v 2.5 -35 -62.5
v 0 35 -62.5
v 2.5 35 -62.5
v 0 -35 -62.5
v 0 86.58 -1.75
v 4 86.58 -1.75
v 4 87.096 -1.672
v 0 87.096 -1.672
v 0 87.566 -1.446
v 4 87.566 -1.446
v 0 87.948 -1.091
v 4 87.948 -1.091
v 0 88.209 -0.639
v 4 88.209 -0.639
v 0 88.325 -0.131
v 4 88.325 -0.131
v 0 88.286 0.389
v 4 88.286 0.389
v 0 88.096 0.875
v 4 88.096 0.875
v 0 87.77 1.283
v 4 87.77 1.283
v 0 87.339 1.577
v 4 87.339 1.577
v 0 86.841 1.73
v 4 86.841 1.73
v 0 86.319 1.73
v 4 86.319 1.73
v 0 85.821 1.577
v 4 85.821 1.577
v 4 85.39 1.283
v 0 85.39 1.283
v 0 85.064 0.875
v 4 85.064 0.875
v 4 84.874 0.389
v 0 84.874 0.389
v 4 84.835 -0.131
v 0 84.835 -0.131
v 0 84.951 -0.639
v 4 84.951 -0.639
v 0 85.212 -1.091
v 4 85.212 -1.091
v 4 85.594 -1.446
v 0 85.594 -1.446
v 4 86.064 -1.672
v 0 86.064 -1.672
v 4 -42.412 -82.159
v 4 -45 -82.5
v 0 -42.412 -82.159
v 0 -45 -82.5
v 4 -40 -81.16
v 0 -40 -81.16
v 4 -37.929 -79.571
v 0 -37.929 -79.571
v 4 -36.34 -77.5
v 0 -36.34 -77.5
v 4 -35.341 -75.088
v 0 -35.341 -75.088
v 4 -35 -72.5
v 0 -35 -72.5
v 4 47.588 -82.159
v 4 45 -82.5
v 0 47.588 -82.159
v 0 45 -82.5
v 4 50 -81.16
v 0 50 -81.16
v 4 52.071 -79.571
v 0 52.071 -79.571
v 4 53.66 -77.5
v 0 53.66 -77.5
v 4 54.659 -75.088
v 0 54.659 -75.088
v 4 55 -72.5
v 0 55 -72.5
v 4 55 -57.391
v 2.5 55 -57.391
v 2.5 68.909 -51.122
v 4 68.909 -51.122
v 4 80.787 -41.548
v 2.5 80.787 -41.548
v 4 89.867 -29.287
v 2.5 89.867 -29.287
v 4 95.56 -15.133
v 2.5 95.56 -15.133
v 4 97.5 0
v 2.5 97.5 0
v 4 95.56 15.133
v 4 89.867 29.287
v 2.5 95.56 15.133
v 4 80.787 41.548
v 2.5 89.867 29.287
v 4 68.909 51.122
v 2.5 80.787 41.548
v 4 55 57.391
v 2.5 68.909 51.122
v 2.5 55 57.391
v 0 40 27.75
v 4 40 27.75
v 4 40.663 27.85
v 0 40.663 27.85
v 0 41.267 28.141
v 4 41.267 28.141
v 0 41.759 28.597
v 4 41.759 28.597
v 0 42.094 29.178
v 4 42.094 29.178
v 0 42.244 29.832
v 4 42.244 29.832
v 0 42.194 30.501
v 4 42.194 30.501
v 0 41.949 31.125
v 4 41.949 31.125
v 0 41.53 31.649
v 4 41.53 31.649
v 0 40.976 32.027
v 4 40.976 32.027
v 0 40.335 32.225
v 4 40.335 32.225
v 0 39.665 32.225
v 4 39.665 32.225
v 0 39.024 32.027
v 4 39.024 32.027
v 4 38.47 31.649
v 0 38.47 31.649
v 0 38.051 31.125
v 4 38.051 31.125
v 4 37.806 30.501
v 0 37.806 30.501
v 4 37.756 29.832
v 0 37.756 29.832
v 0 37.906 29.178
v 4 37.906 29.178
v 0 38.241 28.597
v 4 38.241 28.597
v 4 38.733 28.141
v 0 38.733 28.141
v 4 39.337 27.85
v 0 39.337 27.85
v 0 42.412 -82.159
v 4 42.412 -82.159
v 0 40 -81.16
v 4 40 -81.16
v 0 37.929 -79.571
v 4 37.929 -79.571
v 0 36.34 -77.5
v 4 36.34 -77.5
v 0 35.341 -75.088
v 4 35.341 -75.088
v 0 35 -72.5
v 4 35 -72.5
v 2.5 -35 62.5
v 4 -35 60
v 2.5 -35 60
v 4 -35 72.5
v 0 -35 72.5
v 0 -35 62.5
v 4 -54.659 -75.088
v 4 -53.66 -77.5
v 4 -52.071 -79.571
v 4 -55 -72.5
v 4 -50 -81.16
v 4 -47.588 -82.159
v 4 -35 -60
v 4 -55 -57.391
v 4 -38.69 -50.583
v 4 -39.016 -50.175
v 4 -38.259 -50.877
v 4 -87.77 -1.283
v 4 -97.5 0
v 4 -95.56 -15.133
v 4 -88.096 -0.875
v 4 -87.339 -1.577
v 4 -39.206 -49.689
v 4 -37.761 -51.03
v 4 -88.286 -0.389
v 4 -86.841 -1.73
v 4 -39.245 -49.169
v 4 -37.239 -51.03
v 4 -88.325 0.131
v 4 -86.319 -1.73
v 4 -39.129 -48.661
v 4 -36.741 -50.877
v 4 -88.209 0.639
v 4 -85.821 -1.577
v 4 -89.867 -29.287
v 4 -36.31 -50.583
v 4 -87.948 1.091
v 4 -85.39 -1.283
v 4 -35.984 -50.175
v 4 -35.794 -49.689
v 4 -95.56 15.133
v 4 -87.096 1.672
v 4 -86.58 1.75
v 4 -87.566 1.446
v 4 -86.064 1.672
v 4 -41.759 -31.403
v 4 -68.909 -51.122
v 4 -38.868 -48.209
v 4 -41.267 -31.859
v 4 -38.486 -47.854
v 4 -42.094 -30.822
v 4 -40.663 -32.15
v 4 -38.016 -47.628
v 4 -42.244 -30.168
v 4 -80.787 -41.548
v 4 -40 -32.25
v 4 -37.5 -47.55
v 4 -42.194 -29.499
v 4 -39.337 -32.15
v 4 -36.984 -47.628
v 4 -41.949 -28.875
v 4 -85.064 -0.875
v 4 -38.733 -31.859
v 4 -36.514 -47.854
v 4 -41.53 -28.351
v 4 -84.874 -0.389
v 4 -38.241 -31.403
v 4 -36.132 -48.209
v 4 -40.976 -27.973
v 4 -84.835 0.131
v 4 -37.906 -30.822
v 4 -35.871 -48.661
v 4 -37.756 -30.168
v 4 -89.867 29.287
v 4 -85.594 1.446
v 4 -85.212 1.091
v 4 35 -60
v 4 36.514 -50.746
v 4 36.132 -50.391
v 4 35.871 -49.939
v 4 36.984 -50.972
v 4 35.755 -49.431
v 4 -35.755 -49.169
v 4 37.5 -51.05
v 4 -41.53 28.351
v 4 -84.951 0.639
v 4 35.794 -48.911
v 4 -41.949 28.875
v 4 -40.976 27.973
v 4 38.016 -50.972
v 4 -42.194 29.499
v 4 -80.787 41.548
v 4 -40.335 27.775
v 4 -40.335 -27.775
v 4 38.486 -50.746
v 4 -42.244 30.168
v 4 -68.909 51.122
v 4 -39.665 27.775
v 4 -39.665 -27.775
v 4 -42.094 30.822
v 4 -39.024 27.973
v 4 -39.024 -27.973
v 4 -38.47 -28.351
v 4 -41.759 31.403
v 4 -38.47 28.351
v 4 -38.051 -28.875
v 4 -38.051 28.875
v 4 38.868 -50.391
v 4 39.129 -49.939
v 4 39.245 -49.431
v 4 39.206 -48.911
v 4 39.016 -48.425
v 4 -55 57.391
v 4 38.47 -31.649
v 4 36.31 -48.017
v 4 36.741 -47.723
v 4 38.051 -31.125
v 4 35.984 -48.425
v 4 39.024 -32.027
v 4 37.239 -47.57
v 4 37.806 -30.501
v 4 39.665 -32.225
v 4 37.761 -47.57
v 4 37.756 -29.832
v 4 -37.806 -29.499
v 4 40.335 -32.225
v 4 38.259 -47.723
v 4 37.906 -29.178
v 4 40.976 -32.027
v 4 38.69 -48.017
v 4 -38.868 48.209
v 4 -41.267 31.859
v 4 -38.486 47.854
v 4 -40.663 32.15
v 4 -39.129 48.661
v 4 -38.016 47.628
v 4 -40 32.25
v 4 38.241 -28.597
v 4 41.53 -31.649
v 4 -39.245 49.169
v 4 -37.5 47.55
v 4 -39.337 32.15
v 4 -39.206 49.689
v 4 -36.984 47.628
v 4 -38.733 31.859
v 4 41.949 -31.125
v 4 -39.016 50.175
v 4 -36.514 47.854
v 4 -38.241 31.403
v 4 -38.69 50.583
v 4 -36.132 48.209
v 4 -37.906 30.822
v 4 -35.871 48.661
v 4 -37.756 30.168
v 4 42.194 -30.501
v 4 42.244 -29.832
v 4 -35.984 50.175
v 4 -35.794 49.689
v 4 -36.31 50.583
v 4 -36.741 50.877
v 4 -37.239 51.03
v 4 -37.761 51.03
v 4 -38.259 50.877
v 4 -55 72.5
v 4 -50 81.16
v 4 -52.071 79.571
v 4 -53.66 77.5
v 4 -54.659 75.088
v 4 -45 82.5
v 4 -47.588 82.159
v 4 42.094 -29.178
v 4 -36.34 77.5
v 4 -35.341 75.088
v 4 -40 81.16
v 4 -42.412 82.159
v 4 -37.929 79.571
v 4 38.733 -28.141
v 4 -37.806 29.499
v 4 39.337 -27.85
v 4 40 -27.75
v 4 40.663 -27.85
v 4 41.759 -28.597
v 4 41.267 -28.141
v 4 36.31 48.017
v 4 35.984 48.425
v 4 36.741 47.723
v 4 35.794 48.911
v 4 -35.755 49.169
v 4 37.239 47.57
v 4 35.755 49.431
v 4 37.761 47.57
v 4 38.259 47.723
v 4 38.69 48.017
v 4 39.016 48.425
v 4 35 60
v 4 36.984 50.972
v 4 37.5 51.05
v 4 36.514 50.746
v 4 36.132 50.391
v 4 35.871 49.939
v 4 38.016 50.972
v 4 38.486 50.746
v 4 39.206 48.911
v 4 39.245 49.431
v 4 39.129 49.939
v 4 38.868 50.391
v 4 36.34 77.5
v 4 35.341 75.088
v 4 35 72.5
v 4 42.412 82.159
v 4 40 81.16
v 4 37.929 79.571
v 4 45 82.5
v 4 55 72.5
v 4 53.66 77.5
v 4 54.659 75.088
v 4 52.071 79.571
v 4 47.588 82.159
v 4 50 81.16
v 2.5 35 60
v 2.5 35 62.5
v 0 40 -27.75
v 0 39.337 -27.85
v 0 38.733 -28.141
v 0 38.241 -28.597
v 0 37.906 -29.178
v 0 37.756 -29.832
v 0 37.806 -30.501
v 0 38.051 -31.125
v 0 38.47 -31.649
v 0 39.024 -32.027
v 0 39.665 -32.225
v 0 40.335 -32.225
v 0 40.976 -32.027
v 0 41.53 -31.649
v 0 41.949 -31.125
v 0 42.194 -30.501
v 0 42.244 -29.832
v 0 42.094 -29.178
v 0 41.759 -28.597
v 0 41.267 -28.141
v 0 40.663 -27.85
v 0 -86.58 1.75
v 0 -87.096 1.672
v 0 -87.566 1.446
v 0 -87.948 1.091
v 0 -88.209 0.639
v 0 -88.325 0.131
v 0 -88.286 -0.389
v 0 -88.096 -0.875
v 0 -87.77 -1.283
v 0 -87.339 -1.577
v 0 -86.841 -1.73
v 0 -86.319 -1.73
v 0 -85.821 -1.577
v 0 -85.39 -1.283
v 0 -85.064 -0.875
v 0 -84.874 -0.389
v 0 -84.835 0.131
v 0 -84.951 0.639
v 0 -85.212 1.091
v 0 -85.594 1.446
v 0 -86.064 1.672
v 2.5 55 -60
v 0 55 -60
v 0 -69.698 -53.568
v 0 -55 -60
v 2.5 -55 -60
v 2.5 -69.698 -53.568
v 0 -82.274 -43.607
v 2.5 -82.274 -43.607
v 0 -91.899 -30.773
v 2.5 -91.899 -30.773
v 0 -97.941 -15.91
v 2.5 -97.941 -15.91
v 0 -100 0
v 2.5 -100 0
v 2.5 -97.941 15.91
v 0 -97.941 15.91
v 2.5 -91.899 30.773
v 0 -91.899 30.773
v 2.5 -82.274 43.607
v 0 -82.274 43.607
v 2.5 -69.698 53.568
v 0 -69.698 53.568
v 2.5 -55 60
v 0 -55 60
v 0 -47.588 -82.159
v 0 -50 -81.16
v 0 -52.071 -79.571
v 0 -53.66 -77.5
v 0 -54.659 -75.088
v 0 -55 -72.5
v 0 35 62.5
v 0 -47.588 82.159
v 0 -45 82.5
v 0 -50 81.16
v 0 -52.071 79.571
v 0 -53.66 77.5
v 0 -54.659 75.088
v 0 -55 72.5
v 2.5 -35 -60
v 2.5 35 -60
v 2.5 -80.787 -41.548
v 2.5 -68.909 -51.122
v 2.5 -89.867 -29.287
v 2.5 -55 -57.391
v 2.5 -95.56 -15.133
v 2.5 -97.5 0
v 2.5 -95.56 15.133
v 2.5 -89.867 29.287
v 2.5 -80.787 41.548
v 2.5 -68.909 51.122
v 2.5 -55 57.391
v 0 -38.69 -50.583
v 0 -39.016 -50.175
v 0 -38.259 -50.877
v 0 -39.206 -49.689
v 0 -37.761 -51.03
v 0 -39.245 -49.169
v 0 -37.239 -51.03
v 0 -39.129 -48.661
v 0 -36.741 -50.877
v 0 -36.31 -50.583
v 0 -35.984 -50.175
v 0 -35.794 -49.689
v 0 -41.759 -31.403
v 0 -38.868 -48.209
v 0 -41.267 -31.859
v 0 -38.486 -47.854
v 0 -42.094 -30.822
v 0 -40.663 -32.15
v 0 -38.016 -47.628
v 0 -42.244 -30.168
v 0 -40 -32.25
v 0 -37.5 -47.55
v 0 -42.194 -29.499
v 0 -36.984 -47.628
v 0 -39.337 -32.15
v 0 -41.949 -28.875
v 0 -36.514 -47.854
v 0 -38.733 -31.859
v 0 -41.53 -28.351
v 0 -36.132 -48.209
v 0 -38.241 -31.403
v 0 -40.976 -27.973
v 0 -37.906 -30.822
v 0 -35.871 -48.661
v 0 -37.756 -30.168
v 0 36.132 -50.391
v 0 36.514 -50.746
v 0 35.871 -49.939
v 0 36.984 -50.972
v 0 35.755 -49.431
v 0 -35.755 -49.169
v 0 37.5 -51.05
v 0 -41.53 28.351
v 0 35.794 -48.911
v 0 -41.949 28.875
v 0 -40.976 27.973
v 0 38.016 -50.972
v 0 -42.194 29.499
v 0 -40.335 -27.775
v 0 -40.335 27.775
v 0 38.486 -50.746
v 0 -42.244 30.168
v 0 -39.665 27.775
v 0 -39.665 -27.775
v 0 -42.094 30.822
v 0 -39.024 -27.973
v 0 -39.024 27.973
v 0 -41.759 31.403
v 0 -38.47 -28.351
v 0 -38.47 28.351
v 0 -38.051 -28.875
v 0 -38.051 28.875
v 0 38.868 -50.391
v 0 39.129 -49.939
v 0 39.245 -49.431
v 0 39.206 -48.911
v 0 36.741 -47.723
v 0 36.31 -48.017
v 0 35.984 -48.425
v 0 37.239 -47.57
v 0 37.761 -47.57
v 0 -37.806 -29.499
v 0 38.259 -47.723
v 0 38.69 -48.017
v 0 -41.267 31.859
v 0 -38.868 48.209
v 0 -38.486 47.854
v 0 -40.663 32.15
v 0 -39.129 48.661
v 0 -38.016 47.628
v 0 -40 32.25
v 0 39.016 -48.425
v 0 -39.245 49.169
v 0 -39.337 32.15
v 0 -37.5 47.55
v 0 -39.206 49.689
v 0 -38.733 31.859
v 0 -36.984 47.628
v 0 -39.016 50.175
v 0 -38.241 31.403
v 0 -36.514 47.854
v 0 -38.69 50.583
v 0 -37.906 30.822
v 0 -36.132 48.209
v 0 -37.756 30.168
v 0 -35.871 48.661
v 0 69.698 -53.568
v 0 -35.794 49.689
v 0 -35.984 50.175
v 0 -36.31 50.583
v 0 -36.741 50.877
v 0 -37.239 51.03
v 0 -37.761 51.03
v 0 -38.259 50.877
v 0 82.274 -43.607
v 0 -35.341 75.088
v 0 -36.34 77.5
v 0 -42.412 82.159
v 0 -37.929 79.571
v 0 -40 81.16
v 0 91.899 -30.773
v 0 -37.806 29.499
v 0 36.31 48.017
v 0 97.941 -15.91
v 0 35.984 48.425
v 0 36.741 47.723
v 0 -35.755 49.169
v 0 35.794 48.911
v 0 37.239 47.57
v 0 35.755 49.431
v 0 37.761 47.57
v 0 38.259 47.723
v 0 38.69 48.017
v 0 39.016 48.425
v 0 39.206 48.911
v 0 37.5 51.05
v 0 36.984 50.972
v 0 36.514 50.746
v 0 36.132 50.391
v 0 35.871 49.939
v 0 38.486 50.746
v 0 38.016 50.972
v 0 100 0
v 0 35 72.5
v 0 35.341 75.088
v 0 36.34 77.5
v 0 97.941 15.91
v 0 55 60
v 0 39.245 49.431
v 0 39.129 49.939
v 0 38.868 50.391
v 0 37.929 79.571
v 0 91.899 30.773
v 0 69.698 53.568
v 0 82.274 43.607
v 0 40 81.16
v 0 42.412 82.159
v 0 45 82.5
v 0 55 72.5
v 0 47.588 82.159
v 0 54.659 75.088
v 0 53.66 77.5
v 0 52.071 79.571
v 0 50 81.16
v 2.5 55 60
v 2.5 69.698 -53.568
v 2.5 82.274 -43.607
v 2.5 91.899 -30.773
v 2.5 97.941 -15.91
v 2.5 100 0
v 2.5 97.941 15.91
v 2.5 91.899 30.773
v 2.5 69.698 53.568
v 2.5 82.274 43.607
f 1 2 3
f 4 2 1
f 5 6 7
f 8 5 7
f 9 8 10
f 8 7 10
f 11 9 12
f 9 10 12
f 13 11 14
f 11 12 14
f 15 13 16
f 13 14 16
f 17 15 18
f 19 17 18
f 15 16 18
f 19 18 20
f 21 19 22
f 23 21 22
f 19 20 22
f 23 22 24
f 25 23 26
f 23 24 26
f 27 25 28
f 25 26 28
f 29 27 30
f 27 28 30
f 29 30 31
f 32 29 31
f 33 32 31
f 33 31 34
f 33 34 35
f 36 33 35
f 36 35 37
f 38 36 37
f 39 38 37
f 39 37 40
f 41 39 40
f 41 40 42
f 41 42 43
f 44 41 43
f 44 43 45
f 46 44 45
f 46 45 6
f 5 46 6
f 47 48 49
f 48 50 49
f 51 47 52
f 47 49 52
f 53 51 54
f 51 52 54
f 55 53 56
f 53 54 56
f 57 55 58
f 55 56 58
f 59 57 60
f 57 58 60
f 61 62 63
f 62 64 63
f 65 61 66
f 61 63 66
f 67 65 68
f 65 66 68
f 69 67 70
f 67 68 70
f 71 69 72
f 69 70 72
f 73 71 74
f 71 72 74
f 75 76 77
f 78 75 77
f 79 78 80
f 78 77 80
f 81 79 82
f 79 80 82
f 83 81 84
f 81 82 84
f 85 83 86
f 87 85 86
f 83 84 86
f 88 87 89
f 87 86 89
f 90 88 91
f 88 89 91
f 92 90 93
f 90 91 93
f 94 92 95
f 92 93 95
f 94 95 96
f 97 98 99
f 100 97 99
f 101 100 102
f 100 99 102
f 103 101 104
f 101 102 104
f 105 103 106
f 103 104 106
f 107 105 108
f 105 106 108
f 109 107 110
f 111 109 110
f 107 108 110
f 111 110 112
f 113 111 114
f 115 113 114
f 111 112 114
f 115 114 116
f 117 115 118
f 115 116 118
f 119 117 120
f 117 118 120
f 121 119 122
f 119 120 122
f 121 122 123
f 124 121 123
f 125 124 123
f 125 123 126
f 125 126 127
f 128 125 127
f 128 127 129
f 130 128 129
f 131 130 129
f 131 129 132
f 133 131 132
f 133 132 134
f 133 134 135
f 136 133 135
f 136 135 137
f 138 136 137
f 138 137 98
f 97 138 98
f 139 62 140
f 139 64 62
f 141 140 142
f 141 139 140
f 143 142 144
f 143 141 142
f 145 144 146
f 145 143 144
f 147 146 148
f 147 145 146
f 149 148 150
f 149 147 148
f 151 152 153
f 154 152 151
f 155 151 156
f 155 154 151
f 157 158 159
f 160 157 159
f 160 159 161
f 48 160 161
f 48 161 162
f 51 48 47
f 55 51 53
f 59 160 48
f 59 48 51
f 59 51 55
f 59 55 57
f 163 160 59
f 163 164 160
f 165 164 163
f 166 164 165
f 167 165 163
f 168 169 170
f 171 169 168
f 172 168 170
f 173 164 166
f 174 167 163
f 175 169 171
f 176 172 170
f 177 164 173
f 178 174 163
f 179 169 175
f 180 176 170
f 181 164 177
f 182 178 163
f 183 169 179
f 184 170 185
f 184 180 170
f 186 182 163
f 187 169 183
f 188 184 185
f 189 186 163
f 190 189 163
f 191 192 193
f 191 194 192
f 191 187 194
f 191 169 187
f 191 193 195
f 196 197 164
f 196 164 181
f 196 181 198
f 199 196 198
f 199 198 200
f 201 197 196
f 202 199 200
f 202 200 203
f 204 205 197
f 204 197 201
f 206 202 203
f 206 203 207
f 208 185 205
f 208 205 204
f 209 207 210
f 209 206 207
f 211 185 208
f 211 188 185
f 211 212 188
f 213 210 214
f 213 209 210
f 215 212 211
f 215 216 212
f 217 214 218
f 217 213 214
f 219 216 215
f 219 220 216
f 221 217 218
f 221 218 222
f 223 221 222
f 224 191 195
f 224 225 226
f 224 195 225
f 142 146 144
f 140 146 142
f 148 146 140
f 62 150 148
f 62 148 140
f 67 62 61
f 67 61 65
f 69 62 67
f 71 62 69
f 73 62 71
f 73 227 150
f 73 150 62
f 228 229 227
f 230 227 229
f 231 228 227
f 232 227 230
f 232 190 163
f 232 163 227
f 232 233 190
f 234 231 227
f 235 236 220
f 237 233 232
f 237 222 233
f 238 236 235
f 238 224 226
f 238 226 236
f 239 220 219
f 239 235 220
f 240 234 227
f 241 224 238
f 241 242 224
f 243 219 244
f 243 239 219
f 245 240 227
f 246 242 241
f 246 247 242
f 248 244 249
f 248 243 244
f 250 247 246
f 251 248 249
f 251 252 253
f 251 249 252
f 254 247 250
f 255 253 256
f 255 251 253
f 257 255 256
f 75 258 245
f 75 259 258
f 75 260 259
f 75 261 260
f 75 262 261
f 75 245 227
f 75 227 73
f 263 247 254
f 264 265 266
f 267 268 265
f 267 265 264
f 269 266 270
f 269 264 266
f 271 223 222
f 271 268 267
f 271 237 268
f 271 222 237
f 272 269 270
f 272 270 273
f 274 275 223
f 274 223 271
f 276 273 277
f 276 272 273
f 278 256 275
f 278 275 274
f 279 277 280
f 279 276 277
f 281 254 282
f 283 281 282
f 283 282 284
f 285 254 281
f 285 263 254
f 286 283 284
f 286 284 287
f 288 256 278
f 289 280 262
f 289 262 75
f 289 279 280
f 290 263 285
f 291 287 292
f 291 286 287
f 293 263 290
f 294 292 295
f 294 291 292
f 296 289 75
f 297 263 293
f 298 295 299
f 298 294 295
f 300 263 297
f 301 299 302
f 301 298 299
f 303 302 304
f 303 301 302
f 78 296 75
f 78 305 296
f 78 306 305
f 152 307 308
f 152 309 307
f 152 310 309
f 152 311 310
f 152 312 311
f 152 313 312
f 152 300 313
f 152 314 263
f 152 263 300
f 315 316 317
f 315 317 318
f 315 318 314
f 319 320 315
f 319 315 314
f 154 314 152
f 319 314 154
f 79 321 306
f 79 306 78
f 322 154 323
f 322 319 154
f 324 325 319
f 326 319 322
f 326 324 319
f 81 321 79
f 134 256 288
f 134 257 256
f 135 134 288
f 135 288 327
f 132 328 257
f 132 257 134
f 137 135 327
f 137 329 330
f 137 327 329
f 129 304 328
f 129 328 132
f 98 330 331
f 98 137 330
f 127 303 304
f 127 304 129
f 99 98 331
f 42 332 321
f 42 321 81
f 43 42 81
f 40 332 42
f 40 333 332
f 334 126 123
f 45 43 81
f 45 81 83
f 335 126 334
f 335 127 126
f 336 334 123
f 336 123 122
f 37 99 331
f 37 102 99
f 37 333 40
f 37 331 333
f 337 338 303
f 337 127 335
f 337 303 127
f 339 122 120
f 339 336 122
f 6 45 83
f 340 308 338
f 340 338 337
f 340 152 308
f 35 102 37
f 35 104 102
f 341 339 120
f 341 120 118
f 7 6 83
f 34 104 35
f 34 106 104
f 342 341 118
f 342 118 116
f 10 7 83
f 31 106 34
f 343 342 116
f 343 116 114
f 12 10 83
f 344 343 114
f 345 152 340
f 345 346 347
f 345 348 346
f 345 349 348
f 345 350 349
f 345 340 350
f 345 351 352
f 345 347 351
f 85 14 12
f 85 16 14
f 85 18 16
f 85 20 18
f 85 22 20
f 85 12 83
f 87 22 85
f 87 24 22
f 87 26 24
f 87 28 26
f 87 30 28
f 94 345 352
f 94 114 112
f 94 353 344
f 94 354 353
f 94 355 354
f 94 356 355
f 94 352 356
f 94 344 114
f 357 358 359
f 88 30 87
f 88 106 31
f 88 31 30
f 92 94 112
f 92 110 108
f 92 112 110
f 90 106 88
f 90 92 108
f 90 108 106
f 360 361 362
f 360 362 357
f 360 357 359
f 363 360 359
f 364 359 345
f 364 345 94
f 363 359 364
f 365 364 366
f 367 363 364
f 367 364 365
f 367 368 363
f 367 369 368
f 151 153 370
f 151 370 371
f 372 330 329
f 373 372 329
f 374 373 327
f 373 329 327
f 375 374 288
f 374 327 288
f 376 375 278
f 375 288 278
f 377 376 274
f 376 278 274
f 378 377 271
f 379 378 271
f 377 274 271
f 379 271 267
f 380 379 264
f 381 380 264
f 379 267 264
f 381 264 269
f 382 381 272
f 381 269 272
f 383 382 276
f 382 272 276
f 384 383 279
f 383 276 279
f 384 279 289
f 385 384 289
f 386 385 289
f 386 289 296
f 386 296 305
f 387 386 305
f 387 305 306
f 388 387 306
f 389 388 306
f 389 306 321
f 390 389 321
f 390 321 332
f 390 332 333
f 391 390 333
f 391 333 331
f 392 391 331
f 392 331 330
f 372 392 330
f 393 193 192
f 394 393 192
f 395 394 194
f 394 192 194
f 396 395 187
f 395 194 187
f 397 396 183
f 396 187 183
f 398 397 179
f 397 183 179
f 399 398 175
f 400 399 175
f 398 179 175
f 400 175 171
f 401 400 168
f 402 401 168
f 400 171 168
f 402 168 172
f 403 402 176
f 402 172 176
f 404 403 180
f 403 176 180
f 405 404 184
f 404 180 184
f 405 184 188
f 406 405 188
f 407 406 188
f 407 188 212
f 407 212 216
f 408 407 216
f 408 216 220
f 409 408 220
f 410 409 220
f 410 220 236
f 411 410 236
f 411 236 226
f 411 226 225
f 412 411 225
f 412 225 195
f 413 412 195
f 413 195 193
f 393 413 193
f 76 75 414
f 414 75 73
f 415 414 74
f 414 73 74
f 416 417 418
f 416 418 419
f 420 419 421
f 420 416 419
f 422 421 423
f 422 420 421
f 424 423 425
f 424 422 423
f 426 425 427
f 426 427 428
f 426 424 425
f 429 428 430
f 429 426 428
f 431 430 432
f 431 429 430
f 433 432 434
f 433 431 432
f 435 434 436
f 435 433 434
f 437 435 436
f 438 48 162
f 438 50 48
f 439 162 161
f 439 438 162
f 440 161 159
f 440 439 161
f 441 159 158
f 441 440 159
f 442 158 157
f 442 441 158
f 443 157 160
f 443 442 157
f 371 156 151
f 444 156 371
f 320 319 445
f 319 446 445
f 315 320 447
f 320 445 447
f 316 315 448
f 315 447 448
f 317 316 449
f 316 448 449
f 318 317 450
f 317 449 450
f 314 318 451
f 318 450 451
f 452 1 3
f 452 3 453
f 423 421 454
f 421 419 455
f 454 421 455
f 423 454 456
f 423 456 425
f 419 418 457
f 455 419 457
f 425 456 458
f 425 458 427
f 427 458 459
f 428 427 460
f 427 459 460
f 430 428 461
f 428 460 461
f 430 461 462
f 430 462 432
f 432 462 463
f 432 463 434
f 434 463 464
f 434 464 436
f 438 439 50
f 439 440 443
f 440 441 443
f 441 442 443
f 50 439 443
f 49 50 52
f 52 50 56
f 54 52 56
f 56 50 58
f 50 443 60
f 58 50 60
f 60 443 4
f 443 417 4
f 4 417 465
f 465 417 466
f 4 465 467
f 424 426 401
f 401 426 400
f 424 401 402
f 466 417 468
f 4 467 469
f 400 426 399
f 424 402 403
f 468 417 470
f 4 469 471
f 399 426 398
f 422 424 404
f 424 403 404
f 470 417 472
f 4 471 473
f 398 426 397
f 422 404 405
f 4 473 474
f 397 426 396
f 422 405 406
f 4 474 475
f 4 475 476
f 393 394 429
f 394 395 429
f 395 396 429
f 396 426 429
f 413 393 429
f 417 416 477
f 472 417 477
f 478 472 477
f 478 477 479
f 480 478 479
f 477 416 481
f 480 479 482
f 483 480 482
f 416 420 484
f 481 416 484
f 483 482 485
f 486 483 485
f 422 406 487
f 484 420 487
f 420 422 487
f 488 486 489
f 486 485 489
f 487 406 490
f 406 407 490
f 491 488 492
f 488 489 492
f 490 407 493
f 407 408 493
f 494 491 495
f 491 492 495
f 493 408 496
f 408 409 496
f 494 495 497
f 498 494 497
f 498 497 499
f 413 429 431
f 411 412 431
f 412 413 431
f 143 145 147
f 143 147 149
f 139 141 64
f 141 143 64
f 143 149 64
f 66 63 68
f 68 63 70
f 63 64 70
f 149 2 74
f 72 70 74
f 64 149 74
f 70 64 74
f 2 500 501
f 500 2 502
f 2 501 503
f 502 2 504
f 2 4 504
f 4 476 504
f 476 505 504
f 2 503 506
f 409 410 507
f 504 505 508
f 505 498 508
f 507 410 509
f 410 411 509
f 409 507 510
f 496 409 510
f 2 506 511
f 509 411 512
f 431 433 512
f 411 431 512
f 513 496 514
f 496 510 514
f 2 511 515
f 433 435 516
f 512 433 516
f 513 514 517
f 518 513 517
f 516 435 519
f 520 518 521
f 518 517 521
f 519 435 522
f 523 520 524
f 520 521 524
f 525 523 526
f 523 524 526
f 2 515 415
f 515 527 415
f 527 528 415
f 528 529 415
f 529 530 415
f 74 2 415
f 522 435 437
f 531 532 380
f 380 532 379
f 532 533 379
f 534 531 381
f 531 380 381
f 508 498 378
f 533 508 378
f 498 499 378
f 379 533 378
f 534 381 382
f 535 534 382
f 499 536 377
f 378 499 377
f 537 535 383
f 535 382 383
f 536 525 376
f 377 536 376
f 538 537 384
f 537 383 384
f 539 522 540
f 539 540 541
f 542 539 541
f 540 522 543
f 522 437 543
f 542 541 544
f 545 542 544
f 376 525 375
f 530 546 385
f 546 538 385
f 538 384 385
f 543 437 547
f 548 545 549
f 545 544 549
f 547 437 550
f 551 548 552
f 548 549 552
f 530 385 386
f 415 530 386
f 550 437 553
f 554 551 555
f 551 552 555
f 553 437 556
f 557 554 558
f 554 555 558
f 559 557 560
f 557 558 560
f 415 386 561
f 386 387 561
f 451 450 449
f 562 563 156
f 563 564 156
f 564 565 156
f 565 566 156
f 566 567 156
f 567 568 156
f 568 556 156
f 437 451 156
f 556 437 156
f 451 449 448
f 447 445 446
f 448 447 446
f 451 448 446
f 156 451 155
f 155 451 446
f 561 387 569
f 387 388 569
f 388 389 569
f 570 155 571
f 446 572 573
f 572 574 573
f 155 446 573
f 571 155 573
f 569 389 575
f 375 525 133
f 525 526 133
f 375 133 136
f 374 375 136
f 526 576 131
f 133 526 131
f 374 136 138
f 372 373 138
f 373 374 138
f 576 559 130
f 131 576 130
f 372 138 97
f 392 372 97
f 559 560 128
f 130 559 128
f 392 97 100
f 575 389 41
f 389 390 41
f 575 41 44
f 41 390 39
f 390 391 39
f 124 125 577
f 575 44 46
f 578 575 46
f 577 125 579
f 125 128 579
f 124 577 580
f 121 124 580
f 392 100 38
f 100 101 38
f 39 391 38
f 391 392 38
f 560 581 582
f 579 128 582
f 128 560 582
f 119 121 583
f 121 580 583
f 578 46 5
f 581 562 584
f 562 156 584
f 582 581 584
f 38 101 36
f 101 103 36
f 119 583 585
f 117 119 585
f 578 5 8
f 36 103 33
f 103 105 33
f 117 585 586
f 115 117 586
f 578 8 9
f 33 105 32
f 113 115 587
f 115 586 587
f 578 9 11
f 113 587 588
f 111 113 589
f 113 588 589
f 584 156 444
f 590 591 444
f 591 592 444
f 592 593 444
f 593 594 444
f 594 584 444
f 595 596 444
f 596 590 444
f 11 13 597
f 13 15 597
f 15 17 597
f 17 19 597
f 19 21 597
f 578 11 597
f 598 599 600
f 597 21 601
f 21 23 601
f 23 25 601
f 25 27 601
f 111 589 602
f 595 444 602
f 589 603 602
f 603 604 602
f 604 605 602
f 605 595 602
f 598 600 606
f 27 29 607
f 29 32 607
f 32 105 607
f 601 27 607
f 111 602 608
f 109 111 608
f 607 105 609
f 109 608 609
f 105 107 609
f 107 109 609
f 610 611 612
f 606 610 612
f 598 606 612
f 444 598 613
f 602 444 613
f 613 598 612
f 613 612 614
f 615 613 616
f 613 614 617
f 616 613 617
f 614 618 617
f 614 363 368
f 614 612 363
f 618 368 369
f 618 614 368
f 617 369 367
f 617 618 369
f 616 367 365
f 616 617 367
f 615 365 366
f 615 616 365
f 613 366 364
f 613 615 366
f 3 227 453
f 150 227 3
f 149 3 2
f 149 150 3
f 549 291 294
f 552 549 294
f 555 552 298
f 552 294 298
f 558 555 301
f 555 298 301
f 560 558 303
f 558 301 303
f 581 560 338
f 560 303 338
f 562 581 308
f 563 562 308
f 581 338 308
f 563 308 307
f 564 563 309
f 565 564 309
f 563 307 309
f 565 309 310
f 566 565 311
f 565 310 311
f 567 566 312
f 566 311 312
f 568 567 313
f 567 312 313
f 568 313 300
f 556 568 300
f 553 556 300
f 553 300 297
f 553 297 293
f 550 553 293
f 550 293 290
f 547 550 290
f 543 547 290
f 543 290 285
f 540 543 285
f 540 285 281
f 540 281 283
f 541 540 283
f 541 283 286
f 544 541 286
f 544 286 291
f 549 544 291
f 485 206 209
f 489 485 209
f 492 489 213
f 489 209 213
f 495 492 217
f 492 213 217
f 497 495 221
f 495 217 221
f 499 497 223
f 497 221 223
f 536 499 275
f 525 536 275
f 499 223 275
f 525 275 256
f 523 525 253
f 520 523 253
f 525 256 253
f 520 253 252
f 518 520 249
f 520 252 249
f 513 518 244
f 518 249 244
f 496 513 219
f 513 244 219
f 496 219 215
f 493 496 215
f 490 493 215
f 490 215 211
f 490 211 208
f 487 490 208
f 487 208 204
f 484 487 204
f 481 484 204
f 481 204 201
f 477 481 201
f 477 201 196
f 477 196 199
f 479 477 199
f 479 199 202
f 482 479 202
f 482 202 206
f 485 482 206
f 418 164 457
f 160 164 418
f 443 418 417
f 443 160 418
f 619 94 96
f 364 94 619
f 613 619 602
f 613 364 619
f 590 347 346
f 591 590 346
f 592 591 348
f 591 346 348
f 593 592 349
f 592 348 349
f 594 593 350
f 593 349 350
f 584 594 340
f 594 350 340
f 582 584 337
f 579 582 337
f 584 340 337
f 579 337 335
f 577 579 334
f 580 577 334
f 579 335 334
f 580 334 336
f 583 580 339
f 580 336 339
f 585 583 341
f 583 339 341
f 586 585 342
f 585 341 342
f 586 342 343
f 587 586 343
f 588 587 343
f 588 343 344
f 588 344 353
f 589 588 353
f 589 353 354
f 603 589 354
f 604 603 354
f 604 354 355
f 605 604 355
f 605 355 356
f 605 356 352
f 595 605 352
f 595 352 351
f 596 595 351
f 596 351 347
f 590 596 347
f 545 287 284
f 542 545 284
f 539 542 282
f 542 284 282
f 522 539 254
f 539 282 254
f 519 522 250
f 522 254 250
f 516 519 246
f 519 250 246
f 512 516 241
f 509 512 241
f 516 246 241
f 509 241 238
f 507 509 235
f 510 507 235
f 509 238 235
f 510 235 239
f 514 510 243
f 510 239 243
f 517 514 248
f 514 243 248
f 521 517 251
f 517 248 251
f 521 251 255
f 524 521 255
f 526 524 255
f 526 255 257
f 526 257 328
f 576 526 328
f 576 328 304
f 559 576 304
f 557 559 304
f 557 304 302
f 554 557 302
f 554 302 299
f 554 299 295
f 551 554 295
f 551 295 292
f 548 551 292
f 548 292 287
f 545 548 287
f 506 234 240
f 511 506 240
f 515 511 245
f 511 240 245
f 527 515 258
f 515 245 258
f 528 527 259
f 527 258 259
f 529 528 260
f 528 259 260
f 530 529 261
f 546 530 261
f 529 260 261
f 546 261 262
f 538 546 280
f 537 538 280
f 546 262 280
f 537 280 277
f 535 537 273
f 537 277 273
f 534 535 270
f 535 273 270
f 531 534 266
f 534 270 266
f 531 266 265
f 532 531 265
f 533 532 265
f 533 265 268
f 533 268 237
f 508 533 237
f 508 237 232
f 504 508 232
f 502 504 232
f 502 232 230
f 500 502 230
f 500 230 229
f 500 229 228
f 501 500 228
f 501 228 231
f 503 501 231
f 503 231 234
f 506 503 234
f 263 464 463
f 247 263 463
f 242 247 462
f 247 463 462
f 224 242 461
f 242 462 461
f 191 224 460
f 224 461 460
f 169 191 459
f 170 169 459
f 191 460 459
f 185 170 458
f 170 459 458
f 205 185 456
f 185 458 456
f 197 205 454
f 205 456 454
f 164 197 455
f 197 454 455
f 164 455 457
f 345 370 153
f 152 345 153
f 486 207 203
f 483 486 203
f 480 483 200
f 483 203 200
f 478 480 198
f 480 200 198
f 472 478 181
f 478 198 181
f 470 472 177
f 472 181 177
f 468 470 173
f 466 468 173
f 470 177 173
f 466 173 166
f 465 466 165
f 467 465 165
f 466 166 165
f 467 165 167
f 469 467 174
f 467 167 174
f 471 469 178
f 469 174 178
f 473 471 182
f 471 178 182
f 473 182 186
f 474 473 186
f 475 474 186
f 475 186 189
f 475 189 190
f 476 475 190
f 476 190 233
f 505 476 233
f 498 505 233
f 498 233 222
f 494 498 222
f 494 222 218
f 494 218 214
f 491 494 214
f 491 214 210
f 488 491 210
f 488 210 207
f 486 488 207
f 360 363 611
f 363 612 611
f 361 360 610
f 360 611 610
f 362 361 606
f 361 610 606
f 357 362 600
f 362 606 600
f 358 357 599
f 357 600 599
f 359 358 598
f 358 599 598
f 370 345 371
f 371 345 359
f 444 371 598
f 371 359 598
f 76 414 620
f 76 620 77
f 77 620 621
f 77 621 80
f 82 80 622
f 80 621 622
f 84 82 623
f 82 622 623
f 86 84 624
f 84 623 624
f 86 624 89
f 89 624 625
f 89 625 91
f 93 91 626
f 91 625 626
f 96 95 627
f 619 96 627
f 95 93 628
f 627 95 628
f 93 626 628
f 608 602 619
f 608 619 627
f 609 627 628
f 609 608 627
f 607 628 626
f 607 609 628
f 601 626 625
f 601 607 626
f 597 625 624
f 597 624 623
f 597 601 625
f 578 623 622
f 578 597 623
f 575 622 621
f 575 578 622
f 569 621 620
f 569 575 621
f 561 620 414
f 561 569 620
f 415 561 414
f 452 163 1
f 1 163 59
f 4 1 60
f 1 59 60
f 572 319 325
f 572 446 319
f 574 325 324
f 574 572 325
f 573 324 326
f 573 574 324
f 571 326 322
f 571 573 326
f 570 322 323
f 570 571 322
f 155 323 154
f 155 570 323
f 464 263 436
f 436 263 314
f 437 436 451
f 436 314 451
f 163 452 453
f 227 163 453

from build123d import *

# Parameters (mm, degrees)
BOSS_EXTRUDE1_DEPTH  = 2.5
BOSS_EXTRUDE2_DEPTH  = 1.5
BOSS_EXTRUDE3_REACH  = 178.185
SKETCH4_W            = 4
SKETCH4_H            = 20
FILLET1_R            = 10
FILLET1_OF_MIRROR2_R = 10
SKETCH6_R            = 2.25
CUT_EXTRUDE2_DEPTH   = 130.700616807
SKETCH7_R            = 1.75
CUT_EXTRUDE3_DEPTH   = 130.700616807


with BuildPart() as part:
    # Sketch1 → Boss-Extrude1 (new body)
    with BuildSketch(Plane(origin=(0, 0, 0), x_dir=(0, 0, -1), z_dir=(1, 0, 0))):
        with BuildLine():
            Line((-62.5, -37.5), (-62.5, 37.5))
            ThreePointArc((-62.5, 37.5), (0, 100), (62.5, 37.5))
            Line((62.5, 37.5), (62.5, -37.5))
            ThreePointArc((62.5, -37.5), (0, -100), (-62.5, -37.5))
        make_face()
    extrude(amount=BOSS_EXTRUDE1_DEPTH)

    # Sketch2 → Boss-Extrude2 (add)
    with BuildSketch(Plane(origin=(2.5, 0, 0), x_dir=(0, 0, -1), z_dir=(1, 0, 0))):
        with BuildLine():
            Line((-60, 37.5), (-60, -37.5))
            ThreePointArc((-60, -37.5), (0, -97.5), (60, -37.5))
            Line((60, -37.5), (60, 37.5))
            ThreePointArc((60, 37.5), (0, 97.5), (-60, 37.5))
        make_face()
    extrude(amount=BOSS_EXTRUDE2_DEPTH)

    # Sketch4 → Boss-Extrude3 (add, up to next)
    with BuildSketch(Plane(origin=(0, 0, -82.5), x_dir=(-1, 0, 0), z_dir=(0, 0, -1)), mode=Mode.PRIVATE) as boss_extrude3_sk1:
        with Locations((-2, 45)):
            Rectangle(SKETCH4_W, SKETCH4_H)
    boss_extrude3_tool1 = extrude(boss_extrude3_sk1.sketch, amount=-BOSS_EXTRUDE3_REACH, mode=Mode.PRIVATE) - part.part
    # Sketch4 → Boss-Extrude3 (add, up to next)
    with BuildSketch(Plane(origin=(0, 0, -82.5), x_dir=(-1, 0, 0), z_dir=(0, 0, -1)), mode=Mode.PRIVATE) as boss_extrude3_sk2:
        with Locations((-2, -45)):
            Rectangle(SKETCH4_W, SKETCH4_H)
    boss_extrude3_tool2 = extrude(boss_extrude3_sk2.sketch, amount=-BOSS_EXTRUDE3_REACH, mode=Mode.PRIVATE) - part.part
    boss_extrude3_1 = boss_extrude3_tool1.solids().sort_by_distance((2, 45, -82.5))[0]
    add(boss_extrude3_1)
    boss_extrude3_2 = boss_extrude3_tool2.solids().sort_by_distance((2, -45, -82.5))[0]
    add(boss_extrude3_2)
    boss_extrude3 = boss_extrude3_1 + boss_extrude3_2  # Boss-Extrude3 as one shape, for the pattern or mirror that repeats it

    # Fillet1
    fillet1_edges = [part.edges().sort_by_distance(p)[0] for p in [
        (2, -55, -82.5),
        (2, -35, -82.5),
        (2, 35, -82.5),
        (2, 55, -82.5),
    ]]
    fillet(fillet1_edges, radius=FILLET1_R - 0.0001)  # a hair under: the kernel refuses the full size

    # Mirror2: Boss-Extrude3 across plane
    add(boss_extrude3.mirror(Plane(origin=(0, 0, 0), x_dir=(1, 0, 0), z_dir=(0, 0, -1))))

    # Fillet1 of Mirror2
    fillet1_of_mirror2_edges = [part.edges().sort_by_distance(p)[0] for p in [
        (2, -55, 82.5),
        (2, -35, 82.5),
        (2, 35, 82.5),
        (2, 55, 82.5),
    ]]
    fillet(fillet1_of_mirror2_edges, radius=FILLET1_OF_MIRROR2_R - 0.0001)  # a hair under: the kernel refuses the full size

    # Sketch6 → Cut-Extrude2 (cut, through all)
    with BuildSketch(Plane(origin=(4, 0, 0), x_dir=(0, 0, -1), z_dir=(1, 0, 0))):
        with Locations((-30, 40)):
            Circle(SKETCH6_R)
        with Locations(Location((30, 40, 0), (0, 0, 180))):
            Circle(SKETCH6_R)
        with Locations((30, -40)):
            Circle(SKETCH6_R)
        with Locations(Location((-30, -40, 0), (0, 0, 180))):
            Circle(SKETCH6_R)
    extrude(amount=-CUT_EXTRUDE2_DEPTH, mode=Mode.SUBTRACT)

    # Sketch7 → Cut-Extrude3 (cut, through all)
    with BuildSketch(Plane(origin=(4, 0, 0), x_dir=(0, 0, -1), z_dir=(1, 0, 0))):
        with Locations((0, 86.58)):
            Circle(SKETCH7_R)
        with Locations((49.3, 37.5)):
            Circle(SKETCH7_R)
        with Locations(Location((-49.3, 37.5, 0), (0, 0, 180))):
            Circle(SKETCH7_R)
        with Locations(Location((49.3, -37.5, 0), (0, 0, 180))):
            Circle(SKETCH7_R)
        with Locations(Location((0, -86.58, 0), (0, 0, 180))):
            Circle(SKETCH7_R)
        with Locations((-49.3, -37.5)):
            Circle(SKETCH7_R)
    extrude(amount=-CUT_EXTRUDE3_DEPTH, mode=Mode.SUBTRACT)


solid = part.part
